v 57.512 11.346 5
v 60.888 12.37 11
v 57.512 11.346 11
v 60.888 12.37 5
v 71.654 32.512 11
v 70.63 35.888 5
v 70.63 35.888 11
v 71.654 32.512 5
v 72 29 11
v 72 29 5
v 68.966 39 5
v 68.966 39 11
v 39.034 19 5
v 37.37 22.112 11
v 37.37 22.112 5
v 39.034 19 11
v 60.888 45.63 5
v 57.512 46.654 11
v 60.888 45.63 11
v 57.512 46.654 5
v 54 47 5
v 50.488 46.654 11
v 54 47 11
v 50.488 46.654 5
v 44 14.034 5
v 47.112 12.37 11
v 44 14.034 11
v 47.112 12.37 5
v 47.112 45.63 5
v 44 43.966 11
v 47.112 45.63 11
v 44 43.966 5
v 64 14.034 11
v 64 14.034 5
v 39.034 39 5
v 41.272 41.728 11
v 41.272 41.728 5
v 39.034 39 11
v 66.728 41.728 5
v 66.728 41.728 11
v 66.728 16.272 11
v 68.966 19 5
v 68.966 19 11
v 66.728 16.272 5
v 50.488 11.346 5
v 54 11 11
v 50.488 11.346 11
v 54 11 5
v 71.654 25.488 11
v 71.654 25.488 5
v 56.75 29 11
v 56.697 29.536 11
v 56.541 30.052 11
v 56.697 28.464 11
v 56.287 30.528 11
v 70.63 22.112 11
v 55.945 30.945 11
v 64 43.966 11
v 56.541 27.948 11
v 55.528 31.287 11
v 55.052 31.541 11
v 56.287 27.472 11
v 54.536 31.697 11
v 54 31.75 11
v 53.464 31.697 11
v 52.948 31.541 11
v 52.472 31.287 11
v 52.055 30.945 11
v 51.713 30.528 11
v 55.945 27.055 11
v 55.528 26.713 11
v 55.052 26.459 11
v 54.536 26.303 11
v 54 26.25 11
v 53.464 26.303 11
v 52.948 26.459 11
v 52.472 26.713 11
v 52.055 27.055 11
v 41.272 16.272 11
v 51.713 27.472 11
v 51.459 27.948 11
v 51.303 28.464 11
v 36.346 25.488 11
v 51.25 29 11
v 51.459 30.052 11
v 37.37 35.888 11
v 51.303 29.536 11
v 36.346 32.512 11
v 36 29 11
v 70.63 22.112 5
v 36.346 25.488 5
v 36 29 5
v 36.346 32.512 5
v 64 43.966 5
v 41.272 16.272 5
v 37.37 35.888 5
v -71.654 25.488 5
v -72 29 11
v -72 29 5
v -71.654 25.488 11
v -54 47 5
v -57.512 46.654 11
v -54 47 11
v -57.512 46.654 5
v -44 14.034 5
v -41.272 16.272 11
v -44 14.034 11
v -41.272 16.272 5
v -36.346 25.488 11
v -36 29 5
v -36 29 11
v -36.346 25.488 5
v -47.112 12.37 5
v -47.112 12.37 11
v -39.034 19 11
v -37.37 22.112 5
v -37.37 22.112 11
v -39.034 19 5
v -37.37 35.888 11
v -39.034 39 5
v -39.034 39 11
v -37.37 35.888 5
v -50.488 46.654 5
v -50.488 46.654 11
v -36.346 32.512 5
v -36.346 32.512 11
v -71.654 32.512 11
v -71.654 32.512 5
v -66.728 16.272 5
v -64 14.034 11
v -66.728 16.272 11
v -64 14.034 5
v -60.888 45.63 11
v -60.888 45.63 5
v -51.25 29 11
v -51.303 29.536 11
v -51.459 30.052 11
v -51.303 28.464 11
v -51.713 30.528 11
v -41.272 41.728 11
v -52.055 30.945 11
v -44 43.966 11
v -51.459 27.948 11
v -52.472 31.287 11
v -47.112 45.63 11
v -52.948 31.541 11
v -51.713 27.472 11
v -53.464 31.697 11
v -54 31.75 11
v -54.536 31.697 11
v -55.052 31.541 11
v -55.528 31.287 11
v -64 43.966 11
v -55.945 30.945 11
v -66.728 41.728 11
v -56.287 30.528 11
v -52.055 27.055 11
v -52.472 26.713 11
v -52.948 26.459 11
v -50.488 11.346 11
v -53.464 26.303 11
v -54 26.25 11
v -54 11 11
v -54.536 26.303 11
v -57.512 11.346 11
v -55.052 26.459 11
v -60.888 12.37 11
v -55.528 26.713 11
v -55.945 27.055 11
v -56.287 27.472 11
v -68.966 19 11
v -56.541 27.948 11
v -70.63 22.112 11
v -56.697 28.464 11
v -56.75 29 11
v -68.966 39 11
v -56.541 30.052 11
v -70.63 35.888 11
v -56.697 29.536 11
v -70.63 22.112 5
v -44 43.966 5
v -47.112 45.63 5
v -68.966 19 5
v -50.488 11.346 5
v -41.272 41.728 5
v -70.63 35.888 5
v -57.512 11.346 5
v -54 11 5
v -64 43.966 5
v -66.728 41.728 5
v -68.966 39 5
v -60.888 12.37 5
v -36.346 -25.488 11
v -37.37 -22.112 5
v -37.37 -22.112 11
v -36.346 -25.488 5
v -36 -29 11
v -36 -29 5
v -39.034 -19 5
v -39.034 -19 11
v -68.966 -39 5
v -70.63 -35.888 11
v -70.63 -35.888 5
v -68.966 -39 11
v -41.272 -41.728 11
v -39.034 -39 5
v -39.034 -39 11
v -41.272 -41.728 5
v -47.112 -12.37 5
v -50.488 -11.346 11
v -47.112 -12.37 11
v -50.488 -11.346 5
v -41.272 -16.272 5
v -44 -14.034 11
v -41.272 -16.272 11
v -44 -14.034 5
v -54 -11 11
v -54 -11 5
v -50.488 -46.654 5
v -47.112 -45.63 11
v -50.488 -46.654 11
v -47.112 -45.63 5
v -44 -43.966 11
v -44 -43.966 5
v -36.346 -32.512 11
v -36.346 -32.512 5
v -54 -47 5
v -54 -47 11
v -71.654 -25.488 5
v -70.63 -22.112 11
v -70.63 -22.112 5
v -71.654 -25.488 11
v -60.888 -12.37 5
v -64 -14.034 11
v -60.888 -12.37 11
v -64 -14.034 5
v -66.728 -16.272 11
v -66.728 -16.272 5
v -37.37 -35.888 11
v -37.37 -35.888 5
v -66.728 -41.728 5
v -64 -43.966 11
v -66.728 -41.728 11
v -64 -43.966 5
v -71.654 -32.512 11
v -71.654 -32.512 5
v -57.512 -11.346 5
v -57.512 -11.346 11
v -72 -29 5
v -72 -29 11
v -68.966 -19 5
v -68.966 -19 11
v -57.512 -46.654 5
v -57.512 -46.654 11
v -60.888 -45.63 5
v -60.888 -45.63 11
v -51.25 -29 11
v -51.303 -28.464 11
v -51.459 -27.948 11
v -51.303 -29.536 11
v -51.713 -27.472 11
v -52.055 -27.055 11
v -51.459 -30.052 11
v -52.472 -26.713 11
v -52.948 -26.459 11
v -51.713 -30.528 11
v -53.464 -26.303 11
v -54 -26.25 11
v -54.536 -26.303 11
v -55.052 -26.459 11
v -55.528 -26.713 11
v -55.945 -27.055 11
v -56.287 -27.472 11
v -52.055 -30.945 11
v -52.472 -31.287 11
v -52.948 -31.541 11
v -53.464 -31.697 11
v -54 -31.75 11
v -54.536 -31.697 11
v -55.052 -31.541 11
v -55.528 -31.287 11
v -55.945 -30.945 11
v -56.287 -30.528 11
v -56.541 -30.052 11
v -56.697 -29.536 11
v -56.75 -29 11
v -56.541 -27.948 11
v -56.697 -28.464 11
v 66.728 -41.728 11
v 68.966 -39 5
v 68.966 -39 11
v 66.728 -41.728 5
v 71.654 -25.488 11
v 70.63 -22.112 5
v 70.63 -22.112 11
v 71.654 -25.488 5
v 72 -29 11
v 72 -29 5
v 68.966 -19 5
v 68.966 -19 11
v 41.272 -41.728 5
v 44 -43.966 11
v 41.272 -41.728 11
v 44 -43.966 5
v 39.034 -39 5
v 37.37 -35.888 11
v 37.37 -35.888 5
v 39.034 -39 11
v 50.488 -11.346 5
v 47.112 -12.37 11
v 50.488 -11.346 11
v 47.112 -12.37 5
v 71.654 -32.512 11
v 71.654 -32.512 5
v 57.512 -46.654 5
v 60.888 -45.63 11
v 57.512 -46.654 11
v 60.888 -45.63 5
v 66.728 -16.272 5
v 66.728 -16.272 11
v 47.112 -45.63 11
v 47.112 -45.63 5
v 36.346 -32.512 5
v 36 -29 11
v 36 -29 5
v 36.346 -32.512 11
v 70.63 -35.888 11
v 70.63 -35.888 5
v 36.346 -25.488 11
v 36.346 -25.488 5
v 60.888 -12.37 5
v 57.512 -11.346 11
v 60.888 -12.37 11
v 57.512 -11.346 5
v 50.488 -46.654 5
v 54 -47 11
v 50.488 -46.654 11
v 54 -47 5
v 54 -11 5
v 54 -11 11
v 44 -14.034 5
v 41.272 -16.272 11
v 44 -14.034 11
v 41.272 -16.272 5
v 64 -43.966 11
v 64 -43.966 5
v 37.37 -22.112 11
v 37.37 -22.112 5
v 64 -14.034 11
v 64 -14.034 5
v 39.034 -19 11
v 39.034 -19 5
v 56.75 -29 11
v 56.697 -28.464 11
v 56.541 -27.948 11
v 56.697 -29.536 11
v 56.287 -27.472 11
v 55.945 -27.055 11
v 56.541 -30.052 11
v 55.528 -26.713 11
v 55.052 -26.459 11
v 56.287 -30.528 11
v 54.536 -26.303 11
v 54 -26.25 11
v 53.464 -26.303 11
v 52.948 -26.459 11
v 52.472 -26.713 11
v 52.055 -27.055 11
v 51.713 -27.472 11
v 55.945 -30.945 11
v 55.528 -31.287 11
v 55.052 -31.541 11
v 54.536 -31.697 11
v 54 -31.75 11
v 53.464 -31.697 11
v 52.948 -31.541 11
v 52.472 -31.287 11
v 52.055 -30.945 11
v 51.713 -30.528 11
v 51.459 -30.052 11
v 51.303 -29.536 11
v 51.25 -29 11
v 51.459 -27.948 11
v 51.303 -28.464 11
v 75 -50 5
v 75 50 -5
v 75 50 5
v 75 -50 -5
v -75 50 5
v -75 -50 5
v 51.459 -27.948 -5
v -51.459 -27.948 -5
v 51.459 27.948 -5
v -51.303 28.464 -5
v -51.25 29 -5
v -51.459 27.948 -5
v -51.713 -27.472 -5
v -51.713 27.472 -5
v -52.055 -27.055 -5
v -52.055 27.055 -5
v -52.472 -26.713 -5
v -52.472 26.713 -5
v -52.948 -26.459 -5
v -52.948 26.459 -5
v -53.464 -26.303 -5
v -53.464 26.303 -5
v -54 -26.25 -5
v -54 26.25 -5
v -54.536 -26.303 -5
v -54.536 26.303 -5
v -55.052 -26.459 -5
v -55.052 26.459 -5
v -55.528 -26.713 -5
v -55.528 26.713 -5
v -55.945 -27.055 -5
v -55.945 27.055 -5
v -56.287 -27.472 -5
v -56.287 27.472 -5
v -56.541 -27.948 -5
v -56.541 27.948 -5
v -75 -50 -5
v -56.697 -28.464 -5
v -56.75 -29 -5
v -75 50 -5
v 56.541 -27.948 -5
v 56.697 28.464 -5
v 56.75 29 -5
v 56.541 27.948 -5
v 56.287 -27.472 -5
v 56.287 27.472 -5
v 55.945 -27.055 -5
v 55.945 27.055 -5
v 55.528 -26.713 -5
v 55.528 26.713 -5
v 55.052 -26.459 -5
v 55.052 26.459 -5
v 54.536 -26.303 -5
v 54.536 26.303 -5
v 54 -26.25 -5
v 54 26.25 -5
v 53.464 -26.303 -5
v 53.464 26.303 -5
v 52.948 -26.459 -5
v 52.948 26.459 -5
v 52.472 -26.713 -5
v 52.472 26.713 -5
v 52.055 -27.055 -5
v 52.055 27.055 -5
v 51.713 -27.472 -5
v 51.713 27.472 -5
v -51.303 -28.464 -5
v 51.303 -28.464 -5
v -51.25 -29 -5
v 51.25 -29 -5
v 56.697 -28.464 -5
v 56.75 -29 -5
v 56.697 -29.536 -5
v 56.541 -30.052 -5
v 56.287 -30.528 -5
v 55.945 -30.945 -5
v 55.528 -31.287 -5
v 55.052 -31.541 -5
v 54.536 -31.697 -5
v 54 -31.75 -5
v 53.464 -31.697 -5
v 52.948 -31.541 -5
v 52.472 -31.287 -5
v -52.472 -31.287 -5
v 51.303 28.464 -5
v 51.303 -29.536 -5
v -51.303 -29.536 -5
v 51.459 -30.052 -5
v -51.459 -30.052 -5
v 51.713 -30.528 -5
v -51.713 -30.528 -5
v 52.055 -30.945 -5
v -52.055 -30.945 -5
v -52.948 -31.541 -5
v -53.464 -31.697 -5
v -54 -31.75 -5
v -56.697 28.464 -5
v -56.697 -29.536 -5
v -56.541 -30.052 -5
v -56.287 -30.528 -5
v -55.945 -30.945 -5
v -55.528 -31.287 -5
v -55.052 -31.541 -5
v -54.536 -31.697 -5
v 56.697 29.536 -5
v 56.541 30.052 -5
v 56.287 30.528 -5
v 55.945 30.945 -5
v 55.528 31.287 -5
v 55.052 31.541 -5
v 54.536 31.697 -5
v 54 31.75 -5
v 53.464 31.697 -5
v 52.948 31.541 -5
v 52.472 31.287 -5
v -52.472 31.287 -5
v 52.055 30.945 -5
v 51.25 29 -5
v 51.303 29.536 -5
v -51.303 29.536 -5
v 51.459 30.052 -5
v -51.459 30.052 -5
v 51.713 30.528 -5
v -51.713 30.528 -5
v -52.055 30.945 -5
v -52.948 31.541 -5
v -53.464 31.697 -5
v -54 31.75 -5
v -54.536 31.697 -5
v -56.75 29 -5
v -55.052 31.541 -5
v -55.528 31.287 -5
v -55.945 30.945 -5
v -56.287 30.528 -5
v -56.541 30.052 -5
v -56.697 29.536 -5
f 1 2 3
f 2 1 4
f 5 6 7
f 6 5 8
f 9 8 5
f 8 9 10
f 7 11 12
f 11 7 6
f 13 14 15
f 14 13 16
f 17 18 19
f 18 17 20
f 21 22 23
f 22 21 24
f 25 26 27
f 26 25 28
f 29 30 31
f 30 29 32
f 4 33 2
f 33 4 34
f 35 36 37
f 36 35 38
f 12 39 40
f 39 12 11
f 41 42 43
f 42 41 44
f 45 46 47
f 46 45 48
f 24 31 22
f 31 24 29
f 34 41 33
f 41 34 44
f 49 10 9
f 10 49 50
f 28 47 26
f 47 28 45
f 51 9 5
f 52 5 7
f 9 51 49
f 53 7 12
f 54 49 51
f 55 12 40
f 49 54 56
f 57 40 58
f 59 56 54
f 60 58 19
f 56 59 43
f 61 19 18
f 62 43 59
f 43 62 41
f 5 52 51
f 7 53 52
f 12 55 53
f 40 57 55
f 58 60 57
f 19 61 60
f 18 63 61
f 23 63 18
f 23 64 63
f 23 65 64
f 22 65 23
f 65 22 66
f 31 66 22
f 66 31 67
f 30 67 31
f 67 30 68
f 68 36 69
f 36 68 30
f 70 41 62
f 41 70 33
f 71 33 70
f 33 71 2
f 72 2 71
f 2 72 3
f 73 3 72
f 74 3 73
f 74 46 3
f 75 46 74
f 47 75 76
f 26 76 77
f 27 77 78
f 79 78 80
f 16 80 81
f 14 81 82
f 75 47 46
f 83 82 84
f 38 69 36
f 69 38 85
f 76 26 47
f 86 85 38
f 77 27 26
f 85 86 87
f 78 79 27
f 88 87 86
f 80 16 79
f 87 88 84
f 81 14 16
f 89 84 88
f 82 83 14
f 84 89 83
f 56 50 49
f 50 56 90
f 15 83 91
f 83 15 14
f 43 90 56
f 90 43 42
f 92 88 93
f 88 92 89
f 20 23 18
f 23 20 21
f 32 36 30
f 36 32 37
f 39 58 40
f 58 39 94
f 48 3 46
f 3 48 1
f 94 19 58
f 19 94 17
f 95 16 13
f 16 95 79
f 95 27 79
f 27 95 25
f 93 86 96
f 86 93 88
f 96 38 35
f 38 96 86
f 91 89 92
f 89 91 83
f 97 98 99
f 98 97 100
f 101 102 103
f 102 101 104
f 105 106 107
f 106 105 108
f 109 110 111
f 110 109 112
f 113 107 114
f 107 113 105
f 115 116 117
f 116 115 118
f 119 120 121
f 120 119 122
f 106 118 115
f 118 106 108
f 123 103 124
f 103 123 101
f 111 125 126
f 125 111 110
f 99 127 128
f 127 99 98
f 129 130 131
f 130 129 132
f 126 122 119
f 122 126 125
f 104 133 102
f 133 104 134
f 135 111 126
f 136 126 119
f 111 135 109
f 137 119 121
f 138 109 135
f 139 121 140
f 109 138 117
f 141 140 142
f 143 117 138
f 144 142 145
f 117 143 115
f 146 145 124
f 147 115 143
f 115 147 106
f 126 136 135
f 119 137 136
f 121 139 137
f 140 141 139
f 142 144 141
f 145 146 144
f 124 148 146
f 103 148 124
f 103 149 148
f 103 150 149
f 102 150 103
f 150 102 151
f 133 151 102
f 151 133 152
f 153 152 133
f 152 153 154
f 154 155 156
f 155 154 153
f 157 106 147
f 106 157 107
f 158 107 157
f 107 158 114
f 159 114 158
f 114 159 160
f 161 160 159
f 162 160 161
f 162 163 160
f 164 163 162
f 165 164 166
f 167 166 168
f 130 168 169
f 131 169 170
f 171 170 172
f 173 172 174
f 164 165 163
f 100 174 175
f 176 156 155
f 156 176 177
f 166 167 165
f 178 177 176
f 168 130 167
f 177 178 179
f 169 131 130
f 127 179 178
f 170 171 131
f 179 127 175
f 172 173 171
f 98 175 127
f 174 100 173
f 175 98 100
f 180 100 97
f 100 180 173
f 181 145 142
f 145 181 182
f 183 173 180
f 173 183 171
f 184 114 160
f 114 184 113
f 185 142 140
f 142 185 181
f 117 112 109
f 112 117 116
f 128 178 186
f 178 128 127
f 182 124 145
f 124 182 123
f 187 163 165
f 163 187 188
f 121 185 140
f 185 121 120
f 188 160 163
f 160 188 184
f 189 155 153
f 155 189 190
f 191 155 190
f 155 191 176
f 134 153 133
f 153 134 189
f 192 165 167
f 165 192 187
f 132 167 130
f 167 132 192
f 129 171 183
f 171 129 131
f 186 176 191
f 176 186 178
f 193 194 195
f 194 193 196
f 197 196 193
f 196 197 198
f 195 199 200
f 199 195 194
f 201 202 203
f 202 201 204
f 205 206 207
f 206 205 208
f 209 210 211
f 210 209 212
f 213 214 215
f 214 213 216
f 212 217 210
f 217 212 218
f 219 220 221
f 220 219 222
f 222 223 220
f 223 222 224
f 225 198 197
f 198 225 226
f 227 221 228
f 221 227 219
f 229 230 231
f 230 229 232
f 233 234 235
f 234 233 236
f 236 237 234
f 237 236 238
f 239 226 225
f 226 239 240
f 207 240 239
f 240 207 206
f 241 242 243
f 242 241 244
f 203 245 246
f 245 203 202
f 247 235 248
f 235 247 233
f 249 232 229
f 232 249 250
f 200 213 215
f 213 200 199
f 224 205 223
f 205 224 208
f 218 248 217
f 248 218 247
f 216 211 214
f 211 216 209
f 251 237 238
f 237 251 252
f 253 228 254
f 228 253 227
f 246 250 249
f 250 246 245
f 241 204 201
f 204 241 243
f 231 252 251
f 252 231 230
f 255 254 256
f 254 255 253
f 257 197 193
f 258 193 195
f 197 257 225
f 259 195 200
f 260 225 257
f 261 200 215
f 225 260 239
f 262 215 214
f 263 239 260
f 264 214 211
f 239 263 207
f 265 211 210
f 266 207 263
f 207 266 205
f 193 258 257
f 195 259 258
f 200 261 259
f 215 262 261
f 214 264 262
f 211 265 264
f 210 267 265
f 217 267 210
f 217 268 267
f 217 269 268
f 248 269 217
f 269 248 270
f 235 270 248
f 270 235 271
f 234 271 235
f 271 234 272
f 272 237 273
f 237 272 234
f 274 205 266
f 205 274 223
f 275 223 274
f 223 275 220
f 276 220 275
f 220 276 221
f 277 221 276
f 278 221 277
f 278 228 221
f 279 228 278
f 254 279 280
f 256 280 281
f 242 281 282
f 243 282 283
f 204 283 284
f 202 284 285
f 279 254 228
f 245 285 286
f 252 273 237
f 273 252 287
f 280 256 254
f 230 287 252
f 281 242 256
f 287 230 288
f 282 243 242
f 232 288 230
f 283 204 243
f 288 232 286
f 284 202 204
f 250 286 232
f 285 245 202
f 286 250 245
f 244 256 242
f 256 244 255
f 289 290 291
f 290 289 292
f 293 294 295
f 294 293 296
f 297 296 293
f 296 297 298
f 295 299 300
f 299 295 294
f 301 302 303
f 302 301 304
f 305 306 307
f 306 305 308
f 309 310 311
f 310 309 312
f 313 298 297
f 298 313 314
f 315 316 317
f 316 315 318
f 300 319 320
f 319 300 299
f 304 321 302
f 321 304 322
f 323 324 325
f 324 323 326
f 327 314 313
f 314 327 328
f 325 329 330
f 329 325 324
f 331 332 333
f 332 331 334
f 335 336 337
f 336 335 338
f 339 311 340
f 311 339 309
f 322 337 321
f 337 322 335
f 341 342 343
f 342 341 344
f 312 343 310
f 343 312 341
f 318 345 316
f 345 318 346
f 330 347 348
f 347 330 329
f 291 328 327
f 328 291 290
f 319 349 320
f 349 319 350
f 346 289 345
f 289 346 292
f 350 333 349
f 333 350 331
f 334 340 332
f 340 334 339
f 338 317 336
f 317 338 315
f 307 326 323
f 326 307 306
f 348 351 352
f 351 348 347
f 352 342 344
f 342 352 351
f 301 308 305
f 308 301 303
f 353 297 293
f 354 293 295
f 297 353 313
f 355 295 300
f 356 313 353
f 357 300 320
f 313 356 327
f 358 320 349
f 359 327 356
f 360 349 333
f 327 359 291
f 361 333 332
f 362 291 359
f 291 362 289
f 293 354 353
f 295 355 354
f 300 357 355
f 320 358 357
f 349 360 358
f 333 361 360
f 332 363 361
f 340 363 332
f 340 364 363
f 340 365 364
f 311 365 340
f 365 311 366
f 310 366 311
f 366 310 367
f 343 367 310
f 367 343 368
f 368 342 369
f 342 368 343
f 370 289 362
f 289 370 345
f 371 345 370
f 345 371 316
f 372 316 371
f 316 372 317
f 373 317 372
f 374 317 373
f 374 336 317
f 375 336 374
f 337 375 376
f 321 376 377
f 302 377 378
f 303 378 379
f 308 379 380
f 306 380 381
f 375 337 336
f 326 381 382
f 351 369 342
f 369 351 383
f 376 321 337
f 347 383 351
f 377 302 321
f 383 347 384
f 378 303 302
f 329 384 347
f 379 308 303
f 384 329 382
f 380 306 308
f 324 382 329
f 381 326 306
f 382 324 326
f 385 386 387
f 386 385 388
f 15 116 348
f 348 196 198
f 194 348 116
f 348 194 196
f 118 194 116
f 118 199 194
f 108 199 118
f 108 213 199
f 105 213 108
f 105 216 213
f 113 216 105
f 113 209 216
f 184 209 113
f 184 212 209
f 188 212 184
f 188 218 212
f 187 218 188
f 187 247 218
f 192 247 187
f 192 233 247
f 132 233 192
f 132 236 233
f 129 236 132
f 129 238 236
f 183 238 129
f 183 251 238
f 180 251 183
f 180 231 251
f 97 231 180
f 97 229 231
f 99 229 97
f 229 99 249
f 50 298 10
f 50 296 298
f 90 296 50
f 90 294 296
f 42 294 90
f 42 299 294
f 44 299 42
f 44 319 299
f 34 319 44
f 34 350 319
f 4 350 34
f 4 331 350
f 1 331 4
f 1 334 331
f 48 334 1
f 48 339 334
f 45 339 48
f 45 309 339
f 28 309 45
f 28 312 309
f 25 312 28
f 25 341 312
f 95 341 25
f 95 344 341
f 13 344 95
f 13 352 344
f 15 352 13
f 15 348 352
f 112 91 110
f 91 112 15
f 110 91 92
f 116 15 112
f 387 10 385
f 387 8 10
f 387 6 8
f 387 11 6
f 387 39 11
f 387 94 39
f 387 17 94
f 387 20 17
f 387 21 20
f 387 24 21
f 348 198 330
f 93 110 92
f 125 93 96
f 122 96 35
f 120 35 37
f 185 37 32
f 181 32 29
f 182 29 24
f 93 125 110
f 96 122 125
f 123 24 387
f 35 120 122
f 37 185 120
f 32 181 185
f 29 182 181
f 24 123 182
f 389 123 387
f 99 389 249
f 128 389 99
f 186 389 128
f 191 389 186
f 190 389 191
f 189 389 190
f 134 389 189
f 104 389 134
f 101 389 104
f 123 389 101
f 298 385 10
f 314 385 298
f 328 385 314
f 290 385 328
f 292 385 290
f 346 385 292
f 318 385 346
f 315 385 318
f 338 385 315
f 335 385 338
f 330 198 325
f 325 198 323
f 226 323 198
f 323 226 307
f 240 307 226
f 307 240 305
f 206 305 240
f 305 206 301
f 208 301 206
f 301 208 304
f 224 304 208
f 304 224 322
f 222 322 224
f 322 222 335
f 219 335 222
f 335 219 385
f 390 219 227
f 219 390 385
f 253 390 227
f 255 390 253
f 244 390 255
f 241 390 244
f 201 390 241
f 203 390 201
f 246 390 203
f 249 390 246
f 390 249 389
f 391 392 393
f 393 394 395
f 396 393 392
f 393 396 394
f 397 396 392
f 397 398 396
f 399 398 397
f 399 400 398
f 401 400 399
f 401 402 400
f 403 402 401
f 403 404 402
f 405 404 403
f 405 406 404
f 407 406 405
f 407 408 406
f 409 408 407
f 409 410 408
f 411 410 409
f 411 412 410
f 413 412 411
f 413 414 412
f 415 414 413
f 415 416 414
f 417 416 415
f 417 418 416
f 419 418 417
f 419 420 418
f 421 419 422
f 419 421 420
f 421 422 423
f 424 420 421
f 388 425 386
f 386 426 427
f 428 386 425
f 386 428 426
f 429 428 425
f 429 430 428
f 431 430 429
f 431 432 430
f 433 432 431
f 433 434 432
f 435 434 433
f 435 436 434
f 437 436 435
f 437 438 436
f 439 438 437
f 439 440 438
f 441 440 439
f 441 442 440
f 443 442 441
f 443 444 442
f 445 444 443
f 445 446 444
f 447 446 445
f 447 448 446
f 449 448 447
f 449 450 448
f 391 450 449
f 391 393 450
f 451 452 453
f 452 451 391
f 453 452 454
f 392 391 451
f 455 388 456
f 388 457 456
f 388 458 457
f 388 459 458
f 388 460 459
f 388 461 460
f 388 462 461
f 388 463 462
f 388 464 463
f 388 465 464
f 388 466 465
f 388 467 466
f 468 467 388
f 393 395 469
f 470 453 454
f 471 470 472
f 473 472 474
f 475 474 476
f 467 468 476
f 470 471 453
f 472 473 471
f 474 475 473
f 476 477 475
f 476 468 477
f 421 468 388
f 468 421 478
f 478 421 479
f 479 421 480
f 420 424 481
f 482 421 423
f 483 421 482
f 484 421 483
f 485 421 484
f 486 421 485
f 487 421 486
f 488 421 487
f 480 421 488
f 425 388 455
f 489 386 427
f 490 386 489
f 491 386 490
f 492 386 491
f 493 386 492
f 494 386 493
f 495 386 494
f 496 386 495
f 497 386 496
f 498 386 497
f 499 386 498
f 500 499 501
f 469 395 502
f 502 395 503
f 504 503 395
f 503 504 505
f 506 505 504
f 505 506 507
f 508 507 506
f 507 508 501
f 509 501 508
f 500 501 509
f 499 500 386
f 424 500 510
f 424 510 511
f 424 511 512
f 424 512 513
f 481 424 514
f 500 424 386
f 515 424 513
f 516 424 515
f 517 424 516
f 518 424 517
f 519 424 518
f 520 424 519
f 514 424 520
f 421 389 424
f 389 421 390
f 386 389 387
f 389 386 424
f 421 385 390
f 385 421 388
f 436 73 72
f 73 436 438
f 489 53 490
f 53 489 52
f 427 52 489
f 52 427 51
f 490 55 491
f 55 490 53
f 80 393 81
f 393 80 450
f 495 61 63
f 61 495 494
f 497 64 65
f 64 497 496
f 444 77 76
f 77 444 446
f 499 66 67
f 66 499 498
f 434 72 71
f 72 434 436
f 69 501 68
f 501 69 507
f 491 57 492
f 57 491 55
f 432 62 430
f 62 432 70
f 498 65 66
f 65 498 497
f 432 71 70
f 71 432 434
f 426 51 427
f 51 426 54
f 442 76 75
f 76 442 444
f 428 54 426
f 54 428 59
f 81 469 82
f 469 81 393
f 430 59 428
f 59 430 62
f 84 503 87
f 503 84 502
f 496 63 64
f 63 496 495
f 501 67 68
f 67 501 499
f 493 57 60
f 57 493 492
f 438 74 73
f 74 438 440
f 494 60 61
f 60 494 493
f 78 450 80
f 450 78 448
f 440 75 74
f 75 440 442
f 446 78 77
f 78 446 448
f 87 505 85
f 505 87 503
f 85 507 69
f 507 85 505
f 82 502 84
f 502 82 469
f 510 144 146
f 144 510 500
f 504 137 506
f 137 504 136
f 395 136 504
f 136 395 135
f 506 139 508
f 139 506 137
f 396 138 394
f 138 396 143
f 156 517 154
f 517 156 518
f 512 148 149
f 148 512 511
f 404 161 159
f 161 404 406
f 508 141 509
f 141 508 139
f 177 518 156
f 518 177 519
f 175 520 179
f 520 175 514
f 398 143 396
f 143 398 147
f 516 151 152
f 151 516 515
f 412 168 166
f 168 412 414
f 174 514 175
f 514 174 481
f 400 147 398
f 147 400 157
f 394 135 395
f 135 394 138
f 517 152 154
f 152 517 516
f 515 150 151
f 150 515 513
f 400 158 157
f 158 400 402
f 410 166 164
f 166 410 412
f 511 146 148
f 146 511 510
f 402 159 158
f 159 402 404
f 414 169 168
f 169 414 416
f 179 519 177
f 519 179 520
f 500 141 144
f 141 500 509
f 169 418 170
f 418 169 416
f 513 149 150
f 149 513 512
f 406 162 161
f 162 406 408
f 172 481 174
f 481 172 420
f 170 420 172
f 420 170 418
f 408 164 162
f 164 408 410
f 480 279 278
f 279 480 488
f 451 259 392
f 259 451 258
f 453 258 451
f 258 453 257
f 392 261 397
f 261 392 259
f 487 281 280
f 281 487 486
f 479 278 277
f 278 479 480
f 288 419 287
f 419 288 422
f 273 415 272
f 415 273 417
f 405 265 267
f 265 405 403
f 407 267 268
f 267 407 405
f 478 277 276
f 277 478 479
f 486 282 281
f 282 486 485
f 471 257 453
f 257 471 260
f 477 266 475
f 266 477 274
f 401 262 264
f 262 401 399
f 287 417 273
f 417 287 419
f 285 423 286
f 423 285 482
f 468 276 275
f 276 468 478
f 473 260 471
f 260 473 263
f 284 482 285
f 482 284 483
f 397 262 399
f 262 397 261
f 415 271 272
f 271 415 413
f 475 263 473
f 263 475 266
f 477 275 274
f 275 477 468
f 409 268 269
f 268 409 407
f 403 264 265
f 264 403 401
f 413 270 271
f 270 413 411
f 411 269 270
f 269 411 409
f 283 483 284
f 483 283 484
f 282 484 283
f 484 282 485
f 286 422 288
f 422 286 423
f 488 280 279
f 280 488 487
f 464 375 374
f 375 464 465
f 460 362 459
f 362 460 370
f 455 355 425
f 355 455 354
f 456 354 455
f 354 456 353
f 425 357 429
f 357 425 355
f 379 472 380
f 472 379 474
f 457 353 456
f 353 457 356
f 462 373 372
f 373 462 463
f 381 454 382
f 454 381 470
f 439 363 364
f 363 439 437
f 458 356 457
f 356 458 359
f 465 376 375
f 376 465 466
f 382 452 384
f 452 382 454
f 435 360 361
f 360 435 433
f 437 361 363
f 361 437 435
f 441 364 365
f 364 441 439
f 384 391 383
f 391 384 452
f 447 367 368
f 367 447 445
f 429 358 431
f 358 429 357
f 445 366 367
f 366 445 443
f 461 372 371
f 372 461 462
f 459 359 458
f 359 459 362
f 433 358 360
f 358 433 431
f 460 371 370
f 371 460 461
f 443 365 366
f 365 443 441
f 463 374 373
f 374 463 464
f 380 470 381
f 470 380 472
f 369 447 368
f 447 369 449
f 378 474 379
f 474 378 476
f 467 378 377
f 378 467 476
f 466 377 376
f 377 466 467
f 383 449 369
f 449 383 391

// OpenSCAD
$fn = 32;

// ----------------------------------------------------------------------
// Anchor pads 150 x 100 x 16
// four corner bosses with anchor holes
// ----------------------------------------------------------------------

// --- parameters (mm) ---
plate = [150, 100, 10];  // base plate size (x, y, z)
pads = 4;                // boss count, one per corner
edge = 21;               // boss centre offset from the plate edge
boss_d = 36;             // boss diameter
boss_h = 6;              // boss height above the base plate
hole_d = 5.5;            // hole diameter

// --- derived feature positions (mm) ---
height = plate[2] + boss_h;      // = 16   overall height of the part
corner_x = plate[0] / 2 - edge;  // = 54   boss centre X
corner_y = plate[1] / 2 - edge;  // = 29   boss centre Y
feature_centers = [
  [corner_x, corner_y],
  [-corner_x, corner_y],
  [-corner_x, -corner_y],
  [corner_x, -corner_y]
];   // boss centres, anchor holes are drilled there

// base plate, four bosses standing on it, anchor holes all the way through
difference() {
  union() {
    cube(plate, center = true);
    for (centre = feature_centers)
      translate([centre[0], centre[1], plate[2] / 2 - 1])
        cylinder(d = boss_d, h = boss_h + 1);
  }
  for (centre = feature_centers)
    translate([centre[0], centre[1], -height])
      cylinder(d = hole_d, h = 2 * height + 2);  // through boss and plate
}
